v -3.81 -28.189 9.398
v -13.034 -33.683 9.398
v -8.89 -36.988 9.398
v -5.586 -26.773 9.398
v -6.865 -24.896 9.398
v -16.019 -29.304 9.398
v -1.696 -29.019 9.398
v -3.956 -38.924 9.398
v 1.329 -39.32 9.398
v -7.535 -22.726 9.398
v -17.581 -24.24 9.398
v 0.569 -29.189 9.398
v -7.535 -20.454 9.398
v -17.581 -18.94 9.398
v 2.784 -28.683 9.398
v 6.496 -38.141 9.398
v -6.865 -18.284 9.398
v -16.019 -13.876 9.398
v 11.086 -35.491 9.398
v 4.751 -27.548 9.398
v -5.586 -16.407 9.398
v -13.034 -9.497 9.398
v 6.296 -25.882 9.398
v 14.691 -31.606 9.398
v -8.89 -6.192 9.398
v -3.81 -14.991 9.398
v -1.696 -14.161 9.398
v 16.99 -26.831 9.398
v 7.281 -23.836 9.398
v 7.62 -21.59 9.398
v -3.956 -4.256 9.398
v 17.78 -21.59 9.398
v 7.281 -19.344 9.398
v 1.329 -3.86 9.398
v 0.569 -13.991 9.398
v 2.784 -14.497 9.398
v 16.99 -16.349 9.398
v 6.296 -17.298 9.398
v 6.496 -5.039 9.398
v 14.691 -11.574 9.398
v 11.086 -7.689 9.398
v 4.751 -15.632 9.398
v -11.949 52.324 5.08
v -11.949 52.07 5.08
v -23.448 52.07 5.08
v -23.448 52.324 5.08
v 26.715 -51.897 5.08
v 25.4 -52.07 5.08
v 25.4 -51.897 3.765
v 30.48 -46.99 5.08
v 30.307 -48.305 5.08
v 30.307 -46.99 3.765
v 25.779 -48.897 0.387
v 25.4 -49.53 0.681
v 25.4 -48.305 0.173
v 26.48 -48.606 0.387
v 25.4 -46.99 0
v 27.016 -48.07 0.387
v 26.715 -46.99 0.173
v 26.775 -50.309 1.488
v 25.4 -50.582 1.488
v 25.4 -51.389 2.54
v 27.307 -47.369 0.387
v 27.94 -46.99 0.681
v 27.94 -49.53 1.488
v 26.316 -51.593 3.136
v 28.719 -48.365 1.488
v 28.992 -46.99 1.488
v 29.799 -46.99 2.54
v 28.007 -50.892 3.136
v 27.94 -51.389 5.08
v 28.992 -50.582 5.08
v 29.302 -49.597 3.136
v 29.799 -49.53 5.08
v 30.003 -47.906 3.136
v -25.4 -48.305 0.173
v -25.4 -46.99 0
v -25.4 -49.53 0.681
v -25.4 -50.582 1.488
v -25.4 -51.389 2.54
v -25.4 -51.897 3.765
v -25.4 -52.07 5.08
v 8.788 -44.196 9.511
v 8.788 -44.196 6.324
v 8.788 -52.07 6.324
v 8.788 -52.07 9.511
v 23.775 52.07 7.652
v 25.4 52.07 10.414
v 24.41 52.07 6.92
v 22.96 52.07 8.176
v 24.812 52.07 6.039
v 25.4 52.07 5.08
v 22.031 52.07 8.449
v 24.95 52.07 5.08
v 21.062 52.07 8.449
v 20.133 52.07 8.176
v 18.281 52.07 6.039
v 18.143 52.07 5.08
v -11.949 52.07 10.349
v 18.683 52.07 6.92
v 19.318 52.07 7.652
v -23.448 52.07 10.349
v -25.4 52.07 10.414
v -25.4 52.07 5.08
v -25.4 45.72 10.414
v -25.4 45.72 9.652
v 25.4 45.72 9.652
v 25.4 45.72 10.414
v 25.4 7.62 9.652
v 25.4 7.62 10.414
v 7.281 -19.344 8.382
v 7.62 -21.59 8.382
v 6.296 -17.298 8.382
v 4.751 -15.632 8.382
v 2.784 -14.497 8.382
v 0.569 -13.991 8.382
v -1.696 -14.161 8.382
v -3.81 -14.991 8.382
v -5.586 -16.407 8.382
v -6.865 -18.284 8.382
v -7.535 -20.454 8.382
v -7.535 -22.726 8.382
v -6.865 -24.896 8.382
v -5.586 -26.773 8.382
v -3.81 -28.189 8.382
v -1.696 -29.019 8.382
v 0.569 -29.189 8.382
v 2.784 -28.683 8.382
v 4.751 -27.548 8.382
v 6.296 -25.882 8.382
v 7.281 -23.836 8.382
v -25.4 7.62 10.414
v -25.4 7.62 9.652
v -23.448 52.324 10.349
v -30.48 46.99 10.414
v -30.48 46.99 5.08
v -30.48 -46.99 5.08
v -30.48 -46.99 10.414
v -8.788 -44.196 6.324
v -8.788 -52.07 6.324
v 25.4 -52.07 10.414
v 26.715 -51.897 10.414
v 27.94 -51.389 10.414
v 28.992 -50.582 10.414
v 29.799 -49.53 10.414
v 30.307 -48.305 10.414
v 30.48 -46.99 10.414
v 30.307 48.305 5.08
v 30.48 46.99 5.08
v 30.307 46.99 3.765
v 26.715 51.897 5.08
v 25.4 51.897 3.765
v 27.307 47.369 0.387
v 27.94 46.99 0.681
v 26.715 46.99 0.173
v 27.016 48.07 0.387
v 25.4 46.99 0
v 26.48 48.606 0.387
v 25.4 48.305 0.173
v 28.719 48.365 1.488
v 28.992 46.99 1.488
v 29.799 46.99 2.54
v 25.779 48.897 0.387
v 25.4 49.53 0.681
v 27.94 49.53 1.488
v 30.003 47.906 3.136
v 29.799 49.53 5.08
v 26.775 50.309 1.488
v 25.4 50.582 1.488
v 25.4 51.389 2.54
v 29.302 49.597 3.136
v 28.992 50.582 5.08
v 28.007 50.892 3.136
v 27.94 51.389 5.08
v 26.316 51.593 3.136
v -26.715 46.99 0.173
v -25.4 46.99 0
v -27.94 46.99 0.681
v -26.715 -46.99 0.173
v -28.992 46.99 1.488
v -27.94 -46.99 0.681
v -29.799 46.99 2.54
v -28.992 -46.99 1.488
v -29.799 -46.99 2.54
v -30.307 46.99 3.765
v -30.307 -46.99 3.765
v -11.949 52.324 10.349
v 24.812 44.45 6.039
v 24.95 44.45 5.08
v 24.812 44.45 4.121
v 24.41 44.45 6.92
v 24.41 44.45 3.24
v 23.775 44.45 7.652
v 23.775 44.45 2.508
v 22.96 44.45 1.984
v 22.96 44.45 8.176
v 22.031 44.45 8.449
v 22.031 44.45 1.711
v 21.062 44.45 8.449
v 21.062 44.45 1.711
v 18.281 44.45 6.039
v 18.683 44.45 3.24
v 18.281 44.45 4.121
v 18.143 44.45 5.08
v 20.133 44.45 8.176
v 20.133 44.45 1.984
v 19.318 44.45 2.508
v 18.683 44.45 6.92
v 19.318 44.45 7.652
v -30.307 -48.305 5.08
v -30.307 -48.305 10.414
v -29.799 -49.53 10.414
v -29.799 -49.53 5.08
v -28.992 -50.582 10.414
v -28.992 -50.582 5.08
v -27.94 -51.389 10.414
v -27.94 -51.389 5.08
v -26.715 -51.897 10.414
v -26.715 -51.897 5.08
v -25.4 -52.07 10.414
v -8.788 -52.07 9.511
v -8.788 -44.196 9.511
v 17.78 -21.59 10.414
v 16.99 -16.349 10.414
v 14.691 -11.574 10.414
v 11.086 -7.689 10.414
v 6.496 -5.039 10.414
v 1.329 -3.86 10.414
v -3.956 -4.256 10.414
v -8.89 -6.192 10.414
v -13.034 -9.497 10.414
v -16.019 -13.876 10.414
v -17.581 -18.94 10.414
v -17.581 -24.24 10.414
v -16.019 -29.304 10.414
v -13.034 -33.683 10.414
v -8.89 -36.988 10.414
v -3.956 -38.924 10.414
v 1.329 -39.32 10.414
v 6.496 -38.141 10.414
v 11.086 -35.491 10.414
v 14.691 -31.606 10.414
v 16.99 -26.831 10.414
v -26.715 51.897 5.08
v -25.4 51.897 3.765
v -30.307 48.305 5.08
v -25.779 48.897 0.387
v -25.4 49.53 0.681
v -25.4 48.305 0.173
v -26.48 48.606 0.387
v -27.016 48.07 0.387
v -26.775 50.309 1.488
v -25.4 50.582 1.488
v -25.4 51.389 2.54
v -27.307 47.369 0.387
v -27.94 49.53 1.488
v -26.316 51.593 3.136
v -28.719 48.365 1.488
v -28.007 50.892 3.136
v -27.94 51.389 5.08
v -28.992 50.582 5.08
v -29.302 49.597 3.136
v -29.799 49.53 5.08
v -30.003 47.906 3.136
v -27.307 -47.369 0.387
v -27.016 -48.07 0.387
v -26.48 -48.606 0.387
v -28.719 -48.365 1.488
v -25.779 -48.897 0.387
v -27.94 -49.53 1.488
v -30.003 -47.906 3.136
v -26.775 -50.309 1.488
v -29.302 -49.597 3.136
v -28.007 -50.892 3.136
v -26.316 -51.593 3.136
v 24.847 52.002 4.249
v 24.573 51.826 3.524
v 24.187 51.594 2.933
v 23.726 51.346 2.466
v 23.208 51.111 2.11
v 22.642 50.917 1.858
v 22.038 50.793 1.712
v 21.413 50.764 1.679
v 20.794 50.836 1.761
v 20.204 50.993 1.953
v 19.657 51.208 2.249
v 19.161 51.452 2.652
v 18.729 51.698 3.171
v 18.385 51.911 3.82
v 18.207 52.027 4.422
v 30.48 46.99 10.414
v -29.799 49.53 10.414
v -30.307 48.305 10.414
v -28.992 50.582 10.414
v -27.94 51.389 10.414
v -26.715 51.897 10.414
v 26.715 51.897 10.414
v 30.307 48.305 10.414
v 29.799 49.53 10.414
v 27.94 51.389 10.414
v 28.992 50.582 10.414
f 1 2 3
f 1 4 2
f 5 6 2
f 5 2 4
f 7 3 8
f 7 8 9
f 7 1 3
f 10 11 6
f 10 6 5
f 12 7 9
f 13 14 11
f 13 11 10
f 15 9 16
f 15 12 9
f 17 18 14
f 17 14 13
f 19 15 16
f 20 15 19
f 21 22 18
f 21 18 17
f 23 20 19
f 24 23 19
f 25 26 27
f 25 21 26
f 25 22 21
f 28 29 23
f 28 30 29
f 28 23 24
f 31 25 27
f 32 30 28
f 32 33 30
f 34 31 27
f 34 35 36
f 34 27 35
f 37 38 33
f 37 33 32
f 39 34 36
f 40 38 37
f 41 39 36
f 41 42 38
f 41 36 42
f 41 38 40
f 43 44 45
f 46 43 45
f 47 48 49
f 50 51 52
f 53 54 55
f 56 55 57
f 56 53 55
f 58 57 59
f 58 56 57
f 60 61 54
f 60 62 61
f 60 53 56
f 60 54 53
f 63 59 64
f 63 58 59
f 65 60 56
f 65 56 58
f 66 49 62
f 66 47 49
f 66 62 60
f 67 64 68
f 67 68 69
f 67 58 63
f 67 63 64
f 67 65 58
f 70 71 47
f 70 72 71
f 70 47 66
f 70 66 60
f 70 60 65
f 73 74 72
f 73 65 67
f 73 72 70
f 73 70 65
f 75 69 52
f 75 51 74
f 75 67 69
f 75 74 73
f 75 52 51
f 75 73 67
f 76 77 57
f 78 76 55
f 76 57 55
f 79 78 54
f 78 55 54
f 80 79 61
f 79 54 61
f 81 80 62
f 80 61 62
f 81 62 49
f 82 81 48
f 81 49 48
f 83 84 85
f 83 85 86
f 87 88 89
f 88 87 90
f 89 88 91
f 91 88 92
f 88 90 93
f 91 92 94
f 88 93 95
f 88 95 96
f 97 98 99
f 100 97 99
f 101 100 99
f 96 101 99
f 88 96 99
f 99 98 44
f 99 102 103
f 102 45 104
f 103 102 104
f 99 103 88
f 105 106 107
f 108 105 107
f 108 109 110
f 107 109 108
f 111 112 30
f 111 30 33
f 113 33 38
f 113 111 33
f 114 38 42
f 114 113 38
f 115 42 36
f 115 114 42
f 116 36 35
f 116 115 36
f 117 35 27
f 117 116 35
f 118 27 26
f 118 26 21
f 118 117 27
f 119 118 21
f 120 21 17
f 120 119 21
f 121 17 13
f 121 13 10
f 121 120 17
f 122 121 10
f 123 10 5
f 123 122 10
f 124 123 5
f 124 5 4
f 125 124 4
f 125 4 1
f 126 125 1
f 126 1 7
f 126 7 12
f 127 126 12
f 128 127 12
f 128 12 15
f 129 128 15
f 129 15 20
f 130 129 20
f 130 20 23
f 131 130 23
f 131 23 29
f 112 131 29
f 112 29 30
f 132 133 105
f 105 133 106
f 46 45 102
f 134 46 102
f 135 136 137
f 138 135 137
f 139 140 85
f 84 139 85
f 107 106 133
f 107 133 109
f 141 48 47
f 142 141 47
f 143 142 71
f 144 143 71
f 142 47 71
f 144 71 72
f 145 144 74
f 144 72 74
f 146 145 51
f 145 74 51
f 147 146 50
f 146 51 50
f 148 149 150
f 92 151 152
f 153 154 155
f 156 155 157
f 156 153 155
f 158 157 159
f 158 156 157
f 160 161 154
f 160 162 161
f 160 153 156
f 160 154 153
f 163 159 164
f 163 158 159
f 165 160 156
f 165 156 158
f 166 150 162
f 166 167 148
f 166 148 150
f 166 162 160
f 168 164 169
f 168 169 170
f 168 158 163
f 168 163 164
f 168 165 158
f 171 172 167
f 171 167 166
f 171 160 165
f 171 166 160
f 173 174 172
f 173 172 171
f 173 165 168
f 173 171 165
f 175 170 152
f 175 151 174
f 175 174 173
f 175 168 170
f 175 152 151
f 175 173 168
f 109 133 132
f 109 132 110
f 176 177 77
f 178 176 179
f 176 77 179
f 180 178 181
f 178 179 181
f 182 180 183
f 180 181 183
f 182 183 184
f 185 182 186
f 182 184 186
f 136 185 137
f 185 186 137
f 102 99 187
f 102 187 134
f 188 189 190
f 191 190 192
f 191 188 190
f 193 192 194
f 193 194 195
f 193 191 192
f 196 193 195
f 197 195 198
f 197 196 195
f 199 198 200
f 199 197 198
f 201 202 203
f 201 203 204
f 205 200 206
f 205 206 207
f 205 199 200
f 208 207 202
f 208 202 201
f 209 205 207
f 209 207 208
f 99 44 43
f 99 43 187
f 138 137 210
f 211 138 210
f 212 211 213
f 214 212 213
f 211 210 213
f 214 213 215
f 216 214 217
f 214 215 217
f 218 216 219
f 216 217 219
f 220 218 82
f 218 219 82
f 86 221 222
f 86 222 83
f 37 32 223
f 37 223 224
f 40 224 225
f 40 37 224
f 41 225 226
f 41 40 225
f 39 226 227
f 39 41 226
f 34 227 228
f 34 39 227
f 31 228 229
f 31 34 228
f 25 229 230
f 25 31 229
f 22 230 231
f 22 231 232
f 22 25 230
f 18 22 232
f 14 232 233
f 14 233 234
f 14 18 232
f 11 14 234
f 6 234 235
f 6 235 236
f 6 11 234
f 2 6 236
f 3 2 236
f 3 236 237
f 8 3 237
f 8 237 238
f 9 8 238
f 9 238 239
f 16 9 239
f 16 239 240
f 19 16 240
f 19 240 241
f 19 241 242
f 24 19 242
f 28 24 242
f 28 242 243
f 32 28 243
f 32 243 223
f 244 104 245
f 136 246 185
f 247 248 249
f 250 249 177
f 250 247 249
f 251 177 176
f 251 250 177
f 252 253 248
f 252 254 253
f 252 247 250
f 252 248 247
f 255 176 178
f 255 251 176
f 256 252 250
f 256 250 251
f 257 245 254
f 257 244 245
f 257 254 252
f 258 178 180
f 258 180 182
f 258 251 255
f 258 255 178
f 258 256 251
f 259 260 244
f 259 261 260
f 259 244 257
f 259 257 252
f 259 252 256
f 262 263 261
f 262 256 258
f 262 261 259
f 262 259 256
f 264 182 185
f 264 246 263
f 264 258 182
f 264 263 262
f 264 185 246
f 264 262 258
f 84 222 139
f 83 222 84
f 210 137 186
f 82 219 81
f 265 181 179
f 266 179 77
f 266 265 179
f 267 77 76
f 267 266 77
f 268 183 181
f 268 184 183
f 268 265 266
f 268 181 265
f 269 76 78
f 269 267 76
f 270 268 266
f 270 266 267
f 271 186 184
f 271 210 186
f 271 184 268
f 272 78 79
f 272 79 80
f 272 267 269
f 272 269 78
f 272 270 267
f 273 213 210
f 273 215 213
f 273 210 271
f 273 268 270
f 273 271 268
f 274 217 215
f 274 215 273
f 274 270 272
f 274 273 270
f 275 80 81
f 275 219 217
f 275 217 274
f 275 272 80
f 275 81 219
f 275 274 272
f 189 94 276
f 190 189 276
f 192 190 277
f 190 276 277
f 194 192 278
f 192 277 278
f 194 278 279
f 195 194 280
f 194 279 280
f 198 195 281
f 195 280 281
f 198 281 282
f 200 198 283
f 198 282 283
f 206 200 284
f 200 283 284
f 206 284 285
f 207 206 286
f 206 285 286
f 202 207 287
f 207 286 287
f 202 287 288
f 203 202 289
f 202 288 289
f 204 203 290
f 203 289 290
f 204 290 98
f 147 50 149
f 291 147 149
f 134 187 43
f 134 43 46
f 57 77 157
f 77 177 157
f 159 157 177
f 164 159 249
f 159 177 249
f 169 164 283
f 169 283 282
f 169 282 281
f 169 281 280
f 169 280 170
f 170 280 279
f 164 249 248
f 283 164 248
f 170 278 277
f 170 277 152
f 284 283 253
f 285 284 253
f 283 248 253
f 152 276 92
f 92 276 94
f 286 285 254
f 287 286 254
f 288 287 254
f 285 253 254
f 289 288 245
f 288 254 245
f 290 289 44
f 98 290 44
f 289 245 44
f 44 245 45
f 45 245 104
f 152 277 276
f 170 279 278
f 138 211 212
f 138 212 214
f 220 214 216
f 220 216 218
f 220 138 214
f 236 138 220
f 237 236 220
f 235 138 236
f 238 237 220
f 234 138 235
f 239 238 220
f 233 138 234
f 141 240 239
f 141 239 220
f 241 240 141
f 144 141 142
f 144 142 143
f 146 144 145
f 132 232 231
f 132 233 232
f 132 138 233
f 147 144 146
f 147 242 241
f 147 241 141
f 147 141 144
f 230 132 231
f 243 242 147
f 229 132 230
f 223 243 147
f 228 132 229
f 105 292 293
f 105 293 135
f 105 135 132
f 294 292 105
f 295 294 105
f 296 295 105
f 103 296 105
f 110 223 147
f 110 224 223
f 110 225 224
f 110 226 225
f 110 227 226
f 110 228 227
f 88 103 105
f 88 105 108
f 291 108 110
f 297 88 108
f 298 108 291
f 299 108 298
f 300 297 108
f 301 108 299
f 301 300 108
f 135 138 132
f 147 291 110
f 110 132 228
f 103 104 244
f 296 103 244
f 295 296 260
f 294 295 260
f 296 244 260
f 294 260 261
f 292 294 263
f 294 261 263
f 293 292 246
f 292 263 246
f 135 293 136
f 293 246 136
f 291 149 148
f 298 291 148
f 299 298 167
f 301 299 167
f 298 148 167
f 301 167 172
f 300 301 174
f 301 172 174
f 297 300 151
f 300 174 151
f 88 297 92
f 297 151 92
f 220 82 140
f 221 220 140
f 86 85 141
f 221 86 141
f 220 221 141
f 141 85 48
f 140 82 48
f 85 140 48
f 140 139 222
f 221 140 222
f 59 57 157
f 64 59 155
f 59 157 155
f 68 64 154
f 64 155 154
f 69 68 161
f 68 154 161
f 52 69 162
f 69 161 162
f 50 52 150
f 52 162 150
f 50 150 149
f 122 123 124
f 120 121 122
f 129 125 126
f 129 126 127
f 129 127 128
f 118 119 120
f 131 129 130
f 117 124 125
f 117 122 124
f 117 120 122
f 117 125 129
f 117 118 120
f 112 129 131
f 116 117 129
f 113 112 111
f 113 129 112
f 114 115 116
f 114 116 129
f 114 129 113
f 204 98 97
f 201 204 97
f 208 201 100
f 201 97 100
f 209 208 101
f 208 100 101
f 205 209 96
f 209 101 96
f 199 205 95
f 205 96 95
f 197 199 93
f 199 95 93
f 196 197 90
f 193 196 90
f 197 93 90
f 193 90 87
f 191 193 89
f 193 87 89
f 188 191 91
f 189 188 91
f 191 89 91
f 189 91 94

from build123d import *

# Parameters (mm, degrees)
F0_R      = 17.78
F0_W      = 50.8
F0_H      = 38.1
F1_DEPTH  = 10.414
F2_DEPTH  = 9.652
F0_R_2    = 7.62
F3_DEPTH  = 9.398
F4_DEPTH  = 8.382
F5_R      = 5.08
F6_W      = 17.5757724792
F6_H      = 3.1867753714
F7_DEPTH  = 7.874
F8_W      = 11.499017477
F8_H      = 5.2686166653
F9_DEPTH  = 0.254
F10_DEPTH = 7.62


with BuildPart() as f1:
    # F0 (on Top) → F1 (new body)
    with BuildSketch(Plane.XY):
        with BuildLine():
            Line((25.4, 52.07), (-25.4, 52.07))
            ThreePointArc((-25.4, 52.07), (-28.9921024484, 50.5821024484), (-30.48, 46.99))
            Line((-30.48, 46.99), (-30.48, -46.99))
            ThreePointArc((-30.48, -46.99), (-28.9921024484, -50.5821024484), (-25.4, -52.07))
            Line((-25.4, -52.07), (25.4, -52.07))
            ThreePointArc((25.4, -52.07), (28.9921024484, -50.5821024484), (30.48, -46.99))
            Line((30.48, -46.99), (30.48, 46.99))
            ThreePointArc((30.48, 46.99), (28.9921024484, 50.5821024484), (25.4, 52.07))
        make_face()
        with Locations((0, -21.59)):
            Circle(F0_R, mode=Mode.SUBTRACT)
        with Locations((0, 26.67)):
            Rectangle(F0_W, F0_H, mode=Mode.SUBTRACT)
    extrude(amount=F1_DEPTH)

    # F0 (on Top) → F2 (join)
    with BuildSketch(Plane.XY):
        with Locations((0, 26.67)):
            Rectangle(F0_W, F0_H)
    extrude(amount=F2_DEPTH)

    # F0 (on Top) → F3 (join)
    with BuildSketch(Plane.XY):
        with Locations((0, -21.59)):
            Circle(F0_R)
        with Locations((0, -21.59)):
            Circle(F0_R_2, mode=Mode.SUBTRACT)
    extrude(amount=F3_DEPTH)

    # F0 (on Top) → F4 (join)
    with BuildSketch(Plane.XY):
        with Locations((0, -21.59)):
            Circle(F0_R_2)
    extrude(amount=F4_DEPTH)

    # F5
    f5_edges = [f1.edges().sort_by_distance(p)[0] for p in [
        (-28.992102, -50.582102, 0),
    ]]
    fillet(f5_edges, radius=F5_R)

    # F6 (on face) → F7 (cut)
    with BuildSketch(Plane.XZ.offset(52.07)):
        with Locations((0, 7.9176947474)):
            Rectangle(F6_W, F6_H)
    extrude(amount=-F7_DEPTH, mode=Mode.SUBTRACT)

    # F8 (on face) → F9 (join)
    with BuildSketch(Plane(origin=(0, 52.07, 0), x_dir=(-1, 0, 0), z_dir=(0, 1, 0))):
        with Locations((17.6987573504, 7.7143083327)):
            Rectangle(F8_W, F8_H)
    extrude(amount=F9_DEPTH)

    # F8 (on face) → F10 (cut)
    with BuildSketch(Plane(origin=(0, 52.07, 0), x_dir=(-1, 0, 0), z_dir=(0, 1, 0))):
        with BuildLine():
            ThreePointArc((-24.9499100409, 5.08), (-21.5465091169, 1.676599076), (-18.1431081928, 5.08))
            Line((-18.1431081928, 5.08), (-24.9499100409, 5.08))
        make_face()
        with BuildLine():
            Line((-24.9499100409, 5.08), (-18.1431081928, 5.08))
            ThreePointArc((-18.1431081928, 5.08), (-21.5465091169, 8.483400924), (-24.9499100409, 5.08))
        make_face()
    extrude(amount=-F10_DEPTH, mode=Mode.SUBTRACT)


solid = f1.part
